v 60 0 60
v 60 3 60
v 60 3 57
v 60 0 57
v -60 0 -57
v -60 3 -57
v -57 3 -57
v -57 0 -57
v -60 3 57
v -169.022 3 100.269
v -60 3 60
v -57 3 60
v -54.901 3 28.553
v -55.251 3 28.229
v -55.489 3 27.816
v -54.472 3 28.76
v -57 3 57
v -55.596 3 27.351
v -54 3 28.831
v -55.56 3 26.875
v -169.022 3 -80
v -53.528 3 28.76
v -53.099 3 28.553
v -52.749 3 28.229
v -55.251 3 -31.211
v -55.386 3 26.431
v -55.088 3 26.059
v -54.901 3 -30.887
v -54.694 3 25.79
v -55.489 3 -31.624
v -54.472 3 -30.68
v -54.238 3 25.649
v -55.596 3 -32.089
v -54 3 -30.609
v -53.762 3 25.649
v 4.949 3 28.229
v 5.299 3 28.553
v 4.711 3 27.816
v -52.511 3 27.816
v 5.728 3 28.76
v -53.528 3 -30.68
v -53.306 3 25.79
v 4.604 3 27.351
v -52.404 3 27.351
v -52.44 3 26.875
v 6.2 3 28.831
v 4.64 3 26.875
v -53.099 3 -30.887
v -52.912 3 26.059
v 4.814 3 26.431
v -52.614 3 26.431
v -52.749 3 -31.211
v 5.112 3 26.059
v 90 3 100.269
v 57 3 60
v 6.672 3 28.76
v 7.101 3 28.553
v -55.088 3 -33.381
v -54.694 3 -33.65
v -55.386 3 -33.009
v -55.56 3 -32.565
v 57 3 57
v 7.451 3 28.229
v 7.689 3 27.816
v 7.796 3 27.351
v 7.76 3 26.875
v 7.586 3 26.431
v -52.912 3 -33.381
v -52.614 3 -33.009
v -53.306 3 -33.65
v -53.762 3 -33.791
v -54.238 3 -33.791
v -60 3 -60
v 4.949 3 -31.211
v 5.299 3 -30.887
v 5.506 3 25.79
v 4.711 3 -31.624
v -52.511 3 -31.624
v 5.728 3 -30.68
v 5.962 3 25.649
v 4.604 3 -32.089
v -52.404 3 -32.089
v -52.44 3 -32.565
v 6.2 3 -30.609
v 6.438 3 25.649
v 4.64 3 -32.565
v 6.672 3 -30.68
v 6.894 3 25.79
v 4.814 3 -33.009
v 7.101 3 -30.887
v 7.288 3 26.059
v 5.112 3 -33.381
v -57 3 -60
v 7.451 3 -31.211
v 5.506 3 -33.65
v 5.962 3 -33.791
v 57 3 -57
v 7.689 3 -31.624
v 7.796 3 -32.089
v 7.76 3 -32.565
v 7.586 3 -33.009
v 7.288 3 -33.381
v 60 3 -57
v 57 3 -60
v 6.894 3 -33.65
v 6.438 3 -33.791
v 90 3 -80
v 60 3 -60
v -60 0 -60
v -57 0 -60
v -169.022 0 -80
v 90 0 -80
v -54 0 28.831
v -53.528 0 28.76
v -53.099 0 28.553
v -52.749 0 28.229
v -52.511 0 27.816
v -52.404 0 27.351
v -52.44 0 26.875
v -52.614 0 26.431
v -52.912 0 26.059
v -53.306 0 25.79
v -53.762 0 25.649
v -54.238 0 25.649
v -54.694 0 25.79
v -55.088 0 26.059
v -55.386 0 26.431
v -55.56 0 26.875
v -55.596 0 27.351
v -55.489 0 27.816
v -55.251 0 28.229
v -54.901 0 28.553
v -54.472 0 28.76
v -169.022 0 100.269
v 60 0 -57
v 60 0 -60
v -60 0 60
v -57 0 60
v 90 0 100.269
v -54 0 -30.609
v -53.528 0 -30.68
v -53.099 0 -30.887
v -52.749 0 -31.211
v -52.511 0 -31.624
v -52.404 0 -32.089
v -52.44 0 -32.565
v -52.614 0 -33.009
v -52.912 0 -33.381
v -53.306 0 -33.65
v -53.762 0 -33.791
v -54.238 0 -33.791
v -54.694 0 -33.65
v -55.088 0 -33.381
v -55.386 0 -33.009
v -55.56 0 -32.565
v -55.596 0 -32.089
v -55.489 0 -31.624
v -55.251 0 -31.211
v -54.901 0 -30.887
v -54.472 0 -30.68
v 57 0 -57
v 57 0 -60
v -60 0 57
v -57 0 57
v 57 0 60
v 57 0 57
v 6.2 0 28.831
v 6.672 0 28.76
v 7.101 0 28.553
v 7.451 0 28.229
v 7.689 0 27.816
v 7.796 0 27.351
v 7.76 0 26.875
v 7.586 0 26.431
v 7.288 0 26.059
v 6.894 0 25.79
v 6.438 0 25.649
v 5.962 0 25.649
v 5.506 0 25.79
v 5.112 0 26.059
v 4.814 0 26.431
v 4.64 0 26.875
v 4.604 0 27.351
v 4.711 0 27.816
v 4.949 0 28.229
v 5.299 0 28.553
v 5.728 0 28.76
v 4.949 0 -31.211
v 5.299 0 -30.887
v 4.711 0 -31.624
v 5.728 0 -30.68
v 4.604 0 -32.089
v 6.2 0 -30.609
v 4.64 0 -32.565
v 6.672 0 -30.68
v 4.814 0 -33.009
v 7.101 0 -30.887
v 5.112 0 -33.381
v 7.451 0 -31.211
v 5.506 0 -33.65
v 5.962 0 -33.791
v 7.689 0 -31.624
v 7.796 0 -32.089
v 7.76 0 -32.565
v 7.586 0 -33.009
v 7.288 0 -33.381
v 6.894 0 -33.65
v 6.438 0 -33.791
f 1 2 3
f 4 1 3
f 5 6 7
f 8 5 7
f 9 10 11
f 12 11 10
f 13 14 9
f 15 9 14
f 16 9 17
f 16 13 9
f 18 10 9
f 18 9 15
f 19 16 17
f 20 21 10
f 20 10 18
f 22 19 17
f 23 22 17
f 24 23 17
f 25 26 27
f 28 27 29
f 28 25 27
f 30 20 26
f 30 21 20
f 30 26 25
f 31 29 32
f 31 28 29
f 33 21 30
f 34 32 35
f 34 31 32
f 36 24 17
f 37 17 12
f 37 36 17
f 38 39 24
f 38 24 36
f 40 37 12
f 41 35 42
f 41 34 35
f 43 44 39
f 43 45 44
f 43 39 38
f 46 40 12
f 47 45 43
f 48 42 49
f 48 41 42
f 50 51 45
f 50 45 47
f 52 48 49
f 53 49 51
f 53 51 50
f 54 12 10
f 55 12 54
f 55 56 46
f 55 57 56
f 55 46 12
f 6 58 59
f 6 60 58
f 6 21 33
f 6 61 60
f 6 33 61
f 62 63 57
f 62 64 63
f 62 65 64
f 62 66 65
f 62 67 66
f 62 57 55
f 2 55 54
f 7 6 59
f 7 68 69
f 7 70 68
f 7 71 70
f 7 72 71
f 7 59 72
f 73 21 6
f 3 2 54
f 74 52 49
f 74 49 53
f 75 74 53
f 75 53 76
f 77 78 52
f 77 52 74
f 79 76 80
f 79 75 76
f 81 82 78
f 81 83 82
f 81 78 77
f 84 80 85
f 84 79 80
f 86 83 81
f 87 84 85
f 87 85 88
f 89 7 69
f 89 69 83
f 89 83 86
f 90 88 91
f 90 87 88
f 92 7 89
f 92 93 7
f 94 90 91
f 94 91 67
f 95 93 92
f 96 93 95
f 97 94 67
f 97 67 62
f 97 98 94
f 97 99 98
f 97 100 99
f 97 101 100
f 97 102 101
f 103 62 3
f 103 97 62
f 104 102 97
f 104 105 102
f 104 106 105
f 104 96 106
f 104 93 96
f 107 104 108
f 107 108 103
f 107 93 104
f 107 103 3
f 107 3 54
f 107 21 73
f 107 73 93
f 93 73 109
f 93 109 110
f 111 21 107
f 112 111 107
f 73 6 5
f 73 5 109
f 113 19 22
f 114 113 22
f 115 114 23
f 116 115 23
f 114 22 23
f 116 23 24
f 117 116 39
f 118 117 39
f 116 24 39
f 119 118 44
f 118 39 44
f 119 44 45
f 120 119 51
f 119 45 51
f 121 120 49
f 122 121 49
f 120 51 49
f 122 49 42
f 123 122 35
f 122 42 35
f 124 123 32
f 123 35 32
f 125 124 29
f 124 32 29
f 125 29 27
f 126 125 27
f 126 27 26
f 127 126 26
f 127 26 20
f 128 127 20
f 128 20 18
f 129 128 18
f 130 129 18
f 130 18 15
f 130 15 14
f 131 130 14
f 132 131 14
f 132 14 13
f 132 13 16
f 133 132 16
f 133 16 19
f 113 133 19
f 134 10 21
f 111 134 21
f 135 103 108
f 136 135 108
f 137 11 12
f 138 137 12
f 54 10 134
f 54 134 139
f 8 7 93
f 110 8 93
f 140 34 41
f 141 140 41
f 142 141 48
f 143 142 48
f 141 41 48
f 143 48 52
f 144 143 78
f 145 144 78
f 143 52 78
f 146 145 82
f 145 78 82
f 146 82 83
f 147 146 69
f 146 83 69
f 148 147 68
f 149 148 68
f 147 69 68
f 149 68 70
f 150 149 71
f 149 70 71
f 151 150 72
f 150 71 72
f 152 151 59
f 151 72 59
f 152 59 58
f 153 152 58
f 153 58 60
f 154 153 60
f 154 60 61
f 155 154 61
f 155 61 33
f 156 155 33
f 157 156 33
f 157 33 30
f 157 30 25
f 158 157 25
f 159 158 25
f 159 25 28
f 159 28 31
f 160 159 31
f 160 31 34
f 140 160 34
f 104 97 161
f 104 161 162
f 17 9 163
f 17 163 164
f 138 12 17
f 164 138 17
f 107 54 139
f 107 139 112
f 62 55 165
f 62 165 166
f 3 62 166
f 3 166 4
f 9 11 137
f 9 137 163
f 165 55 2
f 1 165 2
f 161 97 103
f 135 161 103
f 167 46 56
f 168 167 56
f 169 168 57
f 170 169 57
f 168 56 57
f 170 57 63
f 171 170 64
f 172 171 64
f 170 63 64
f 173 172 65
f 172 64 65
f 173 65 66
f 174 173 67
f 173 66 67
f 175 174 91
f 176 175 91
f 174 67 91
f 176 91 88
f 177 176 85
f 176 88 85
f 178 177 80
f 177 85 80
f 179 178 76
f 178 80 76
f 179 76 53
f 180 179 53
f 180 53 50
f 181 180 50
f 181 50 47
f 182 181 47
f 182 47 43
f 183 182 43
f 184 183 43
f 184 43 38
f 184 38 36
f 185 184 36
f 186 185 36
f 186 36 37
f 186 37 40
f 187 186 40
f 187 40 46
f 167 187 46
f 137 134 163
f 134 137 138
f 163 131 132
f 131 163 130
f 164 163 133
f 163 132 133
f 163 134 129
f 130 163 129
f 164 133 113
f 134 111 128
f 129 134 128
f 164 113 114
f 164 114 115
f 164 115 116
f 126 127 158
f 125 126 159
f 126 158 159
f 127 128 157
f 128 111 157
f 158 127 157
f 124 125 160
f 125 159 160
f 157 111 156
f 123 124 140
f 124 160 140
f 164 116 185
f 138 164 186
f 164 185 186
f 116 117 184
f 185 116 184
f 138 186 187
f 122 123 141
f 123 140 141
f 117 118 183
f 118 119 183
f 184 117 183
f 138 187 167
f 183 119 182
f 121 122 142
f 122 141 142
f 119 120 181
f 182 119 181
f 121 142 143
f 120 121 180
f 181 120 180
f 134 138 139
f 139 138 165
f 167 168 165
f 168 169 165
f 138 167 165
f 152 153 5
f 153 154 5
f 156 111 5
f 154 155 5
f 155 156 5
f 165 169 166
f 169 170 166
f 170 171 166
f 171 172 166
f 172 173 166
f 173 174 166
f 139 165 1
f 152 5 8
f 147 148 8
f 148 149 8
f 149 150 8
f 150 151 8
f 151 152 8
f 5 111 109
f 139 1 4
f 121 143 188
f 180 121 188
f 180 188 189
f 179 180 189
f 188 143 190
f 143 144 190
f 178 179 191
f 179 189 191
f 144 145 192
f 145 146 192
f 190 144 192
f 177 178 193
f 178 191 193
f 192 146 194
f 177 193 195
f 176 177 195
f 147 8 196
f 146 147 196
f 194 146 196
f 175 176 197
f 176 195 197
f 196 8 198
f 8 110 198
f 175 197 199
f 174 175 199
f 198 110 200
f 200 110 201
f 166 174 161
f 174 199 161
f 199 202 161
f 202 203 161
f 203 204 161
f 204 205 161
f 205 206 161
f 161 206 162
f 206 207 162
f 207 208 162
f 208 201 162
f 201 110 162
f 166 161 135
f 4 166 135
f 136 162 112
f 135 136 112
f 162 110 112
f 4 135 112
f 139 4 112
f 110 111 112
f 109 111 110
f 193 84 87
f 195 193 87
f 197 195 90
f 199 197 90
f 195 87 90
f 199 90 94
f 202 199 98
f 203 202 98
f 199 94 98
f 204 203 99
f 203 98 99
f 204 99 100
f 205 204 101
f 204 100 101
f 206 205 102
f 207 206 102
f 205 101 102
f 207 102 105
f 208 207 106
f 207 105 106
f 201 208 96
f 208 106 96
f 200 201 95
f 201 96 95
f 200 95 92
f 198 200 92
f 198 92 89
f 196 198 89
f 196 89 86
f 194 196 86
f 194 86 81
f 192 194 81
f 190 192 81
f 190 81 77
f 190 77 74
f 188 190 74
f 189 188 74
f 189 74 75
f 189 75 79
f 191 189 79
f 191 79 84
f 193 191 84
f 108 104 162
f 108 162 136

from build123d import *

# Parameters (mm, degrees)
SKETCH1_W           = 140
SKETCH1_H           = 160
BOSS_EXTRUDE1_DEPTH = 3
SKETCH2_W           = 120
SKETCH2_H           = 120
SKETCH2_W_2         = 114
SKETCH2_H_2         = 114
BOSS_EXTRUDE2_DEPTH = 70
SKETCH4_W           = 120
SKETCH4_H           = 120
BOSS_EXTRUDE4_DEPTH = 3
SKETCH5_R           = 2.1
SKETCH5_W           = 39.9
SKETCH5_H           = 19.71
CUT_EXTRUDE2_DEPTH  = 3
SKETCH6_W           = 18.298163042
SKETCH6_H           = 17.309993256
CUT_EXTRUDE3_DEPTH  = 3
CUT_EXTRUDE8_DEPTH  = 5
SKETCH15_W          = 259.021634325
SKETCH15_H          = 180.269434884
BOSS_EXTRUDE5_DEPTH = 3
SKETCH18_R          = 1.6
CUT_EXTRUDE9_DEPTH  = 10
SKETCH19_W          = 12
SKETCH19_H          = 4.5
SKETCH19_H_2        = 8.4
SKETCH19_W_2        = 10.084057066
SKETCH19_H_3        = 7.362028533
CUT_EXTRUDE11_DEPTH = 5
SKETCH20_W          = 147.415821731
SKETCH20_H          = 93.246752781
CUT_EXTRUDE13_DEPTH = 262.306082135
SKETCH21_W          = 3
SKETCH21_H          = 3
CUT_EXTRUDE14_DEPTH = 197.5483972


with BuildPart() as part:
    # Sketch1 → Boss-Extrude1 (new body)
    with BuildSketch(Plane(origin=(0, 0, 0), x_dir=(1, 0, 0), z_dir=(0, 1, 0))):
        Rectangle(SKETCH1_W, SKETCH1_H)
    extrude(amount=BOSS_EXTRUDE1_DEPTH)

    # Sketch2 → Boss-Extrude2 (add)
    with BuildSketch(Plane(origin=(0, 3, 0), x_dir=(1, 0, 0), z_dir=(0, 1, 0))):
        Rectangle(SKETCH2_W, SKETCH2_H)
        Rectangle(SKETCH2_W_2, SKETCH2_H_2, mode=Mode.SUBTRACT)
    extrude(amount=BOSS_EXTRUDE2_DEPTH)

    # Sketch4 → Boss-Extrude4 (add)
    with BuildSketch(Plane(origin=(0, 73, 0), x_dir=(1, 0, 0), z_dir=(0, 1, 0))):
        Rectangle(SKETCH4_W, SKETCH4_H)
    extrude(amount=BOSS_EXTRUDE4_DEPTH)

    # Sketch5 → Cut-Extrude2 (cut)
    with BuildSketch(Plane(origin=(0, 76, 0), x_dir=(1, 0, 0), z_dir=(0, 1, 0))):
        with Locations(Location((34.39, -4.925, 0), (0, 0, 270))):
            Circle(SKETCH5_R)
        with Locations(Location((34.39, 4.925, 0), (0, 0, 270))):
            Circle(SKETCH5_R)
        with Locations(Location((-15.03, -4.925, 0), (0, 0, 270))):
            Circle(SKETCH5_R)
        with Locations(Location((-15.03, 4.925, 0), (0, 0, 270))):
            Circle(SKETCH5_R)
        with Locations((9.68, 0)):
            Rectangle(SKETCH5_W, SKETCH5_H)
    extrude(amount=-CUT_EXTRUDE2_DEPTH, mode=Mode.SUBTRACT)

    # Sketch6 → Cut-Extrude3 (cut)
    with BuildSketch(Plane(origin=(0, 76, 0), x_dir=(1, 0, 0), z_dir=(0, 1, 0))):
        Rectangle(SKETCH6_W, SKETCH6_H)
    extrude(amount=-CUT_EXTRUDE3_DEPTH, mode=Mode.SUBTRACT)

    # Sketch13 → Cut-Extrude8 (cut)
    with BuildSketch(Plane(origin=(0, 76, 0), x_dir=(1, 0, 0), z_dir=(0, 1, 0))):
        with BuildLine():
            ThreePointArc((-3.792582359, 49.728765052), (-53.491503795, -1.722579942), (-0.349490011, -49.609426409))
            ThreePointArc((-0.349490011, -49.609426409), (5.82592347, -42.51288634), (-1.270616599, -36.337472859))
            ThreePointArc((-1.270616599, -36.337472859), (-40.195607742, -1.261740085), (-3.792582359, 36.42488497))
            ThreePointArc((-3.792582359, 36.42488497), (2.859357682, 43.076825011), (-3.792582359, 49.728765052))
        make_face()
    extrude(amount=-CUT_EXTRUDE8_DEPTH, mode=Mode.SUBTRACT)

    # Sketch15 → Boss-Extrude5 (add)
    with BuildSketch(Plane(origin=(0, 3, 0), x_dir=(1, 0, 0), z_dir=(0, 1, 0))):
        with Locations((-39.510817163, -10.134717442)):
            Rectangle(SKETCH15_W, SKETCH15_H)
    extrude(amount=-BOSS_EXTRUDE5_DEPTH)

    # Sketch18 → Cut-Extrude9 (cut)
    with BuildSketch(Plane(origin=(0, 3, 0), x_dir=(1, 0, 0), z_dir=(0, 1, 0))):
        with Locations(Location((-54, -27.231420358, 0), (0, 0, 270))):
            Circle(SKETCH18_R)
        with Locations(Location((6.2, -27.231420358, 0), (0, 0, 270))):
            Circle(SKETCH18_R)
        with Locations(Location((-54, 32.208579642, 0), (0, 0, 270))):
            Circle(SKETCH18_R)
        with Locations(Location((6.2, 32.208579642, 0), (0, 0, 270))):
            Circle(SKETCH18_R)
    extrude(amount=-CUT_EXTRUDE9_DEPTH, mode=Mode.SUBTRACT)

    # Sketch19 → Cut-Extrude11 (cut)
    with BuildSketch(Plane.ZY.offset(60)):
        with Locations((12.367420358, 33)):
            Rectangle(SKETCH19_W, SKETCH19_H)
        with Locations((-11.259414931, 37.2)):
            Rectangle(SKETCH19_W, SKETCH19_H_2)
        with Locations((-28.606781654, 36.742945388)):
            Rectangle(SKETCH19_W_2, SKETCH19_H_3)
    extrude(amount=-CUT_EXTRUDE11_DEPTH, mode=Mode.SUBTRACT)

    # Sketch20 → Cut-Extrude13 (cut, through all)
    with BuildSketch(Plane(origin=(60, 0, 0), x_dir=(0, 0, -1), z_dir=(1, 0, 0))):
        with Locations((-5.661677996, 49.623376391)):
            Rectangle(SKETCH20_W, SKETCH20_H)
    extrude(amount=-CUT_EXTRUDE13_DEPTH, mode=Mode.SUBTRACT)

    # Sketch21 → Cut-Extrude14 (cut, through all)
    with BuildSketch(Plane(origin=(0, 3, 0), x_dir=(1, 0, 0), z_dir=(0, 1, 0))):
        with Locations((-58.5, 58.5)):
            Rectangle(SKETCH21_W, SKETCH21_H)
        with Locations((58.5, -58.5)):
            Rectangle(SKETCH21_W, SKETCH21_H)
        with Locations((58.5, 58.5)):
            Rectangle(SKETCH21_W, SKETCH21_H)
        with Locations((-58.5, -58.5)):
            Rectangle(SKETCH21_W, SKETCH21_H)
    extrude(amount=-CUT_EXTRUDE14_DEPTH, mode=Mode.SUBTRACT)


solid = part.part
